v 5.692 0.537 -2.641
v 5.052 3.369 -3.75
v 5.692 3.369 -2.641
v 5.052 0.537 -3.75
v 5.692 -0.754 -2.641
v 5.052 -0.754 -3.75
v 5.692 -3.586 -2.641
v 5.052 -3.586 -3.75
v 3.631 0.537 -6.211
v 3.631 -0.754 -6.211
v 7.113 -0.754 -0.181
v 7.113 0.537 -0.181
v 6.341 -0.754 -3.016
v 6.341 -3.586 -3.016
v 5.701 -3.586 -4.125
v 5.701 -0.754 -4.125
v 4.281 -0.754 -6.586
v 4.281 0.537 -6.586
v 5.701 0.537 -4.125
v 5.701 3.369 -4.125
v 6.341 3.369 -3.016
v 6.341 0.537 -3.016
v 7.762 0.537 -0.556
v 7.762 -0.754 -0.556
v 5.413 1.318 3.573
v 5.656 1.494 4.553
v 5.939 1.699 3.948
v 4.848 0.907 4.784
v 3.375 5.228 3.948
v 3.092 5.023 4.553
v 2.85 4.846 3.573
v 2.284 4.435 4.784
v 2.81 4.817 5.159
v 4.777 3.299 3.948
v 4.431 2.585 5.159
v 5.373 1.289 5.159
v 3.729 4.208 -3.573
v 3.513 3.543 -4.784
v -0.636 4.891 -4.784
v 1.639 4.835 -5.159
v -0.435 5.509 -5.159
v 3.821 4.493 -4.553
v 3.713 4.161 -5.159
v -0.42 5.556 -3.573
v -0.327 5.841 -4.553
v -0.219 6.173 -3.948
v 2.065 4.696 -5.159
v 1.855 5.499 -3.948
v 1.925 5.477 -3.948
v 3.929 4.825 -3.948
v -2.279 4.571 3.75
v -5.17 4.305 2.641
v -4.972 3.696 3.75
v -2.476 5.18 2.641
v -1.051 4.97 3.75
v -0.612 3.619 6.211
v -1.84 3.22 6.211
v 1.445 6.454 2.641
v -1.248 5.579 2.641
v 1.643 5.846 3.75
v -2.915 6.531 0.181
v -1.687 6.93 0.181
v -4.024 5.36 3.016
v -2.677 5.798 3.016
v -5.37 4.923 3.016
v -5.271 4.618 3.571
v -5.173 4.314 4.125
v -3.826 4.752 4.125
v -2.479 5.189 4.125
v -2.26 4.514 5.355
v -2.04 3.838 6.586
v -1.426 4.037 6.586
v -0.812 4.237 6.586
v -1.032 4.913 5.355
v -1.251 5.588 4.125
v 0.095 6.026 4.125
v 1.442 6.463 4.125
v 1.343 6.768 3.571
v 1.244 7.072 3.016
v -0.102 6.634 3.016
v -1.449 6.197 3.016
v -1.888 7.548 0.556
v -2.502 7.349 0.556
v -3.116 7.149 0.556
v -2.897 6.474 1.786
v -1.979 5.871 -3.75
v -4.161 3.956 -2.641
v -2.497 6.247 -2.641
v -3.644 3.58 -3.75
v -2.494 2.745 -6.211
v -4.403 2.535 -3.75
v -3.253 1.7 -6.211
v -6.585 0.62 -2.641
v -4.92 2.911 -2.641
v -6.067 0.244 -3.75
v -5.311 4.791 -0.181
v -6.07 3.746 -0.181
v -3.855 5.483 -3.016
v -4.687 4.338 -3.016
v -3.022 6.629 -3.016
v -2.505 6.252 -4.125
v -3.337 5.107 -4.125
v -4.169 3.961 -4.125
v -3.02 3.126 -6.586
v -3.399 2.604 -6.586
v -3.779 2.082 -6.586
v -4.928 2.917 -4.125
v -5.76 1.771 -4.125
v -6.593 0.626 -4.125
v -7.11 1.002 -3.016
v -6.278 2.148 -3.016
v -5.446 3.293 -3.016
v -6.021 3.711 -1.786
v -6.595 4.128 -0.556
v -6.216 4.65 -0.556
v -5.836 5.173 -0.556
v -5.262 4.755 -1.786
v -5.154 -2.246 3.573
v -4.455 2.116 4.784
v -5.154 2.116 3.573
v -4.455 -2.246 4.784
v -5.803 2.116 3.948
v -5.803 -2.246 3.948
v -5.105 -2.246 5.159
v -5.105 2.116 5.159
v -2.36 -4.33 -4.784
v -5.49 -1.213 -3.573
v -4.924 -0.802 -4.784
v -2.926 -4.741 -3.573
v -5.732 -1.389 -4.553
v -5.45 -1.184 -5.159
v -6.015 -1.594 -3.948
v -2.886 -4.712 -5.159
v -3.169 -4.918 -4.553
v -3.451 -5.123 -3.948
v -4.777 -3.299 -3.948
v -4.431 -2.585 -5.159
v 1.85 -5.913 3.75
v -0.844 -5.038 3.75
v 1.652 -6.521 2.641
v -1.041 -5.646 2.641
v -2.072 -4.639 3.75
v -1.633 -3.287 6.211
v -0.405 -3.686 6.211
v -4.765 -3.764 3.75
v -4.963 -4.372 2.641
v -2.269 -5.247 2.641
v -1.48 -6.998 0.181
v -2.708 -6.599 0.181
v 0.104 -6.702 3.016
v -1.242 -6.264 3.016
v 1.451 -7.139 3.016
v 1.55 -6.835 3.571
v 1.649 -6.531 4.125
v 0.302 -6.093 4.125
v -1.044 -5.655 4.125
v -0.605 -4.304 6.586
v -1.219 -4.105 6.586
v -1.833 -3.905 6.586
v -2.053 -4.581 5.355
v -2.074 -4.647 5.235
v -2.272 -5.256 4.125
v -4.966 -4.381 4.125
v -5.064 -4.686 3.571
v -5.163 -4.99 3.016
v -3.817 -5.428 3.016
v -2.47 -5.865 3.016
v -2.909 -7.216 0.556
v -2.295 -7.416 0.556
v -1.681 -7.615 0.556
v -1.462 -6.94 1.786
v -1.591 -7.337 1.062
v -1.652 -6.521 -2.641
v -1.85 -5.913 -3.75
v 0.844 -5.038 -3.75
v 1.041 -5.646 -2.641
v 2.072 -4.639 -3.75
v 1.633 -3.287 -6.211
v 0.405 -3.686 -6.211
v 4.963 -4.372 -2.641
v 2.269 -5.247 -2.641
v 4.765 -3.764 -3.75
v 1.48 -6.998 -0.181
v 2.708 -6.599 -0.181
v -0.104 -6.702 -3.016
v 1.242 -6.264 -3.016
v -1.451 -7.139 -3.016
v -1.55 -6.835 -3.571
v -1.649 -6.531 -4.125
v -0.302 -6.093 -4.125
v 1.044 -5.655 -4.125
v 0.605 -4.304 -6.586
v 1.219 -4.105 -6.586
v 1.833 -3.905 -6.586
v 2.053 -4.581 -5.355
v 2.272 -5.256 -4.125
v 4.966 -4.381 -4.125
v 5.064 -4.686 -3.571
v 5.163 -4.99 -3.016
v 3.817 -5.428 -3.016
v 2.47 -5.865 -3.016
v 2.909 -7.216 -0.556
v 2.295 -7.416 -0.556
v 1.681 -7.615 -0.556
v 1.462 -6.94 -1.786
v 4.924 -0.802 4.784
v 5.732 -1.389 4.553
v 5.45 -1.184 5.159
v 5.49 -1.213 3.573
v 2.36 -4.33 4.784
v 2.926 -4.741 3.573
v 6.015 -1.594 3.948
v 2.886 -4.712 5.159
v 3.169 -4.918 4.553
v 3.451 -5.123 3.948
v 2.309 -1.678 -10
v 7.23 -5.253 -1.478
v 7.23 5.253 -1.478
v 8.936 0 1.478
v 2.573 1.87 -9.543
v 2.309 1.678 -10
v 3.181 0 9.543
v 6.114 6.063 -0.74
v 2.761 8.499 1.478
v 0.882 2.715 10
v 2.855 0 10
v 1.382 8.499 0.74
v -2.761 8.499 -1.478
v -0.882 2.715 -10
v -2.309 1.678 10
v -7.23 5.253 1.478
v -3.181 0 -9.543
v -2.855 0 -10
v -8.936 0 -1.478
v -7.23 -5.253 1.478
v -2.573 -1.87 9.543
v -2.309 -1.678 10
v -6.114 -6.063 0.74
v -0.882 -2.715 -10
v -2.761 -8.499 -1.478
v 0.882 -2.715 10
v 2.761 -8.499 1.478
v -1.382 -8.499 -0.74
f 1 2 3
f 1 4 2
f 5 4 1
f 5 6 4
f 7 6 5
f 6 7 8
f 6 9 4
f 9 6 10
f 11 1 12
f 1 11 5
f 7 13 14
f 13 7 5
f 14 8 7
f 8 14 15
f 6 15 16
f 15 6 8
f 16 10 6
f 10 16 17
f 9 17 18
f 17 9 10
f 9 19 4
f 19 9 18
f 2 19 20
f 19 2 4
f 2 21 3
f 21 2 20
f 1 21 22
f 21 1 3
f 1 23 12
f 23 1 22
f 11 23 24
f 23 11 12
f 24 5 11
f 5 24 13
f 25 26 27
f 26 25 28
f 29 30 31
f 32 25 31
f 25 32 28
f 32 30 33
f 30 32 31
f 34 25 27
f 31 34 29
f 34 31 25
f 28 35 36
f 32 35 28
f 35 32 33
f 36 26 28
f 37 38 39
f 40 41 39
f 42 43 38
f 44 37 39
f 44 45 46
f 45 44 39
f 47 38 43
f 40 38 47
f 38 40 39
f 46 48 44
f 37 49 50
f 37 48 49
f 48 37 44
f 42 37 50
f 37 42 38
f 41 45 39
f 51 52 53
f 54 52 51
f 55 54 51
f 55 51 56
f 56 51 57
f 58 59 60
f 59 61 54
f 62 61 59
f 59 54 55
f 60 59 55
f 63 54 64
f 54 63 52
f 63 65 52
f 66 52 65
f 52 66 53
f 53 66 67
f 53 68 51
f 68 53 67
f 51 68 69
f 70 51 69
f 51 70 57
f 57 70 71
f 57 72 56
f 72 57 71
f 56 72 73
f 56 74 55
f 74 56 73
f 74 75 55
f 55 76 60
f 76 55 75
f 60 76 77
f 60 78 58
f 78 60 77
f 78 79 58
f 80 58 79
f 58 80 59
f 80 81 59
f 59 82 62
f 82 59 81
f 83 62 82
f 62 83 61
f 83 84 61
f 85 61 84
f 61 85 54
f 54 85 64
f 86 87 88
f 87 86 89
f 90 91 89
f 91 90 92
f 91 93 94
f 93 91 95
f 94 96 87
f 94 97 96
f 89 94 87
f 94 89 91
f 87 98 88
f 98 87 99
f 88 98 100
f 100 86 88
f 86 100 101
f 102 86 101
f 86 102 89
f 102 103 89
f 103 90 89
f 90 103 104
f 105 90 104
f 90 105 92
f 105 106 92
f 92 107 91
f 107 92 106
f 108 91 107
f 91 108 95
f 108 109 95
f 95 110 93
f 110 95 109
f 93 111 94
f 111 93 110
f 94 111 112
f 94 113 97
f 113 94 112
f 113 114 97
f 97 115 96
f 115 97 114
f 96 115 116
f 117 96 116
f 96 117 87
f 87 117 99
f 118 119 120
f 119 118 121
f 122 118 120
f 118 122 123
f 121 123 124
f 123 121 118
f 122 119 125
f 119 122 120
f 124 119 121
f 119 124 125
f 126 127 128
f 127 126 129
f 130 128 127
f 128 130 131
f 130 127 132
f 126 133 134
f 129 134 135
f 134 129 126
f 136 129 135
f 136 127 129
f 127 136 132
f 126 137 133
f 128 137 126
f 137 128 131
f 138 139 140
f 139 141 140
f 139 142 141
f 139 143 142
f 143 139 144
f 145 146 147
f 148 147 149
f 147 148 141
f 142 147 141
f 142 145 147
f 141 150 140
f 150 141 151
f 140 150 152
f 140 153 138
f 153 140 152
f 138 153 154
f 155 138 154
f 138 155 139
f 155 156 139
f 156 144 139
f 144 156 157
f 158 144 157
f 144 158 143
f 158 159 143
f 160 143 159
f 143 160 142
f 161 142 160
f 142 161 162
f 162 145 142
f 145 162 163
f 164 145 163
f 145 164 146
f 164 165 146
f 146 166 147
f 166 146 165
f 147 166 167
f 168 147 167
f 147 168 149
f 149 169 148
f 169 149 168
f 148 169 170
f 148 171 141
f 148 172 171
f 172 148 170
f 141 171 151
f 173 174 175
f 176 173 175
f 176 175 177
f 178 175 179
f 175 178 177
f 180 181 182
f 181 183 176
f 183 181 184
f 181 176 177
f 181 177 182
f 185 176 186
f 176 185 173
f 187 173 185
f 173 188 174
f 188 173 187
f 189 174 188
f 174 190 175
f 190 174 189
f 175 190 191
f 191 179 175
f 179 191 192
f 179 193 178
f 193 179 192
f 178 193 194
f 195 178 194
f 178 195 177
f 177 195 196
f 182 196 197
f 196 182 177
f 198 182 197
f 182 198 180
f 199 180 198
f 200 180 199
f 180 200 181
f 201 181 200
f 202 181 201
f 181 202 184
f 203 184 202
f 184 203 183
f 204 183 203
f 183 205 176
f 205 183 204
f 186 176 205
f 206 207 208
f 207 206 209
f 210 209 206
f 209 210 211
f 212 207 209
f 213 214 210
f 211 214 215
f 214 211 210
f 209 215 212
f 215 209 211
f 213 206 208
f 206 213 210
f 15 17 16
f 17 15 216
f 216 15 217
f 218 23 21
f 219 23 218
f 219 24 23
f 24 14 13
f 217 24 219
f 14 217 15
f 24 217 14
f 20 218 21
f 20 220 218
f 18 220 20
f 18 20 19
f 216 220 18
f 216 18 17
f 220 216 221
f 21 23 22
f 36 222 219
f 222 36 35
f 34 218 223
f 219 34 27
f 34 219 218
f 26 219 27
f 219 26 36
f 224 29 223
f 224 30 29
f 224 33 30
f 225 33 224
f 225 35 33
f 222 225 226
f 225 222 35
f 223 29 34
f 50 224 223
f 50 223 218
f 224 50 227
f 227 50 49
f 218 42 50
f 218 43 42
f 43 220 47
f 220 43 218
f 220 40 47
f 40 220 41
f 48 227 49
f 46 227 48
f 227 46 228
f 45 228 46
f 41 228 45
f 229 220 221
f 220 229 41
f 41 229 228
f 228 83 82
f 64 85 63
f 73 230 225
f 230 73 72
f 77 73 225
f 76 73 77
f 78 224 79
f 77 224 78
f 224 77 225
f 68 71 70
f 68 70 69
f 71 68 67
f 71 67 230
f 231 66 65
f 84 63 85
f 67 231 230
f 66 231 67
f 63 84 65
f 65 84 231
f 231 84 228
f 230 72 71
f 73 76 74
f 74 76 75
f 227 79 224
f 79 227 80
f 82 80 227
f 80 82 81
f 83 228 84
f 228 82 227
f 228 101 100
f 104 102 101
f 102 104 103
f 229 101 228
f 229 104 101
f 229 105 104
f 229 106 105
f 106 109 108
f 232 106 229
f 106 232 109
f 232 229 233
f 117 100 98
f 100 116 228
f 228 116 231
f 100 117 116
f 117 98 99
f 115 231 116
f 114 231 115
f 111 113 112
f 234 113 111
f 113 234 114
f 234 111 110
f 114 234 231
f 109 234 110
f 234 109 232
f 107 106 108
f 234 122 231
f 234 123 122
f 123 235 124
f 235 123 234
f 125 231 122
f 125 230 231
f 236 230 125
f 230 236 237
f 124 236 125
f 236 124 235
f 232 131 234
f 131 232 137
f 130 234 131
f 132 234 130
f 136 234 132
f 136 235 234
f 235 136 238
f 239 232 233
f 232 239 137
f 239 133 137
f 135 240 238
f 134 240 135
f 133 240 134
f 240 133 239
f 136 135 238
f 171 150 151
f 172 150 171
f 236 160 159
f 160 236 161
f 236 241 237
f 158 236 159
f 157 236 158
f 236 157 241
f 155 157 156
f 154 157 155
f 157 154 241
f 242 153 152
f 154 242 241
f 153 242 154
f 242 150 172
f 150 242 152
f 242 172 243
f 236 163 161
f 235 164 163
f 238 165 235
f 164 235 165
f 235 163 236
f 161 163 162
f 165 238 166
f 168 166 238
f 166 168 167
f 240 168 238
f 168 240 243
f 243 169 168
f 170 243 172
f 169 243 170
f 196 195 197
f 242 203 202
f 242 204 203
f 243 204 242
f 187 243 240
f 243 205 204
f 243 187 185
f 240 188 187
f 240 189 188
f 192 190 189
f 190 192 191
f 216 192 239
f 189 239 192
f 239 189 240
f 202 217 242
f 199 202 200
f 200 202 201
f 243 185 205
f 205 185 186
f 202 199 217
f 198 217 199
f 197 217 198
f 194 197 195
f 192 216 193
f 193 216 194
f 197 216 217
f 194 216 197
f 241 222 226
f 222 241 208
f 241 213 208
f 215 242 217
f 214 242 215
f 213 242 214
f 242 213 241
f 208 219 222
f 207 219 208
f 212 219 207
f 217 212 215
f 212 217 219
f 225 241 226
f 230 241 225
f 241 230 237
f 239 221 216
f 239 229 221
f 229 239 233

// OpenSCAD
mode = "binary";

sides = 10;
thickness = 7;
facet_angle = 30;
vertical_size=20; // dice may be smaller if facet_angle is too steep
sign_scale_factor = .8;
number_vertical_adjust = 0;
number_offset = 0;



bianry_font = "Arial Black:style=Bold";


rot_angle = 360 / (sides / 2);
angle_offset = (rot_angle/2) * ((sides/2)%2);
rot = 20;
sign_offset = thickness;
 
module number (num) {

    number = num+number_offset;
    text_num = number == 6 ? str(number, ".") : (number == 9 ? str(number, ".") : str(number));

    translate([sign_offset, 0,number_vertical_adjust]) 
        rotate([90,0,90]) 
            scale([sign_scale_factor, sign_scale_factor, 1]) 
                linear_extrude(1.5, center=true) 
                    text(text_num, halign="center", valign="center");
}

module binary(num) {

    if(num == 0) {
        translate([sign_offset, 0,number_vertical_adjust]) 
            rotate([90,0,90]) 
                scale([sign_scale_factor, sign_scale_factor, 1]) 
                    linear_extrude(1.5, center=true) 
                        text("–", font=bianry_font, halign="center", valign="center");
    }
    if(num == 1) {
        translate([sign_offset, 0,number_vertical_adjust]) 
            rotate([90,0,90]) 
                scale([sign_scale_factor, sign_scale_factor, 1]) 
                    linear_extrude(1.5, center=true) 
                        text("+", font=bianry_font, halign="center", valign="center");
    }
}

if(mode == "arabic") {
    difference() {
        cube([300,300,vertical_size], center=true);
        for(i=[0:(sides/2)-1]){

            angle_1 = i*rot_angle;
            angle_2 = angle_offset + i * rot_angle;
 
            rotate([facet_angle,facet_angle,angle_1]) 
                translate([150+thickness,0,0]) 
                    cube([300,300,300], center=true);
                    
            rotate([-facet_angle,-facet_angle, angle_2]) 
                translate([150+thickness,0,0]) 
                    cube([300,300,300], center=true);
            
            if(i % 2 == 0) {
                rotate([180,facet_angle,angle_1]) number(i);
                rotate([0,-facet_angle,angle_2]) number(sides/2+i);
            }
            else {
                rotate([180,facet_angle,angle_1]) number(sides/2+i);
                rotate([0,-facet_angle,angle_2]) number(i);
            }
        }
    }
}
if(mode == "binary"){
    difference() {
        cube([300,300,vertical_size], center=true);
        for(i=[0:(sides/2)-1]){

            angle_1 = i*rot_angle;
            angle_2 = angle_offset + i * rot_angle;

            rotate([facet_angle,facet_angle,angle_1]) 
                translate([150+thickness,0,0]) 
                    cube([300,300,300], center=true);
                    
            rotate([-facet_angle,-facet_angle, angle_2]) 
                translate([150+thickness,0,0]) 
                    cube([300,300,300], center=true);
            
            if(i % 2 == 0) {
                rotate([180,facet_angle,angle_1]) binary(1);
                rotate([0,-facet_angle,angle_2]) binary(0);
            }
            else {
                rotate([180,facet_angle,angle_1]) binary(0);
                rotate([0,-facet_angle,angle_2]) binary(1);
            }
        }
    }
}

if(mode == "roman"){
    //TODO
    difference() {
        cube([300,300,vertical_size], center=true);
        for(i=[0:(sides/2)-1]){

            angle_1 = i*rot_angle;
            angle_2 = angle_offset + i * rot_angle;

            rotate([facet_angle,facet_angle,angle_1]) 
                translate([150+thickness,0,0]) 
                    cube([300,300,300], center=true);
                    
            rotate([-facet_angle,-facet_angle, angle_2]) 
                translate([150+thickness,0,0]) 
                    cube([300,300,300], center=true);
            
            if(i % 2 == 0) {
                rotate([180,facet_angle,angle_1]) binary(1);
                rotate([0,-facet_angle,angle_2]) binary(0);
            }
            else {
                rotate([180,facet_angle,angle_1]) binary(0);
                rotate([0,-facet_angle,angle_2]) binary(1);
            }
        }
    }
}
